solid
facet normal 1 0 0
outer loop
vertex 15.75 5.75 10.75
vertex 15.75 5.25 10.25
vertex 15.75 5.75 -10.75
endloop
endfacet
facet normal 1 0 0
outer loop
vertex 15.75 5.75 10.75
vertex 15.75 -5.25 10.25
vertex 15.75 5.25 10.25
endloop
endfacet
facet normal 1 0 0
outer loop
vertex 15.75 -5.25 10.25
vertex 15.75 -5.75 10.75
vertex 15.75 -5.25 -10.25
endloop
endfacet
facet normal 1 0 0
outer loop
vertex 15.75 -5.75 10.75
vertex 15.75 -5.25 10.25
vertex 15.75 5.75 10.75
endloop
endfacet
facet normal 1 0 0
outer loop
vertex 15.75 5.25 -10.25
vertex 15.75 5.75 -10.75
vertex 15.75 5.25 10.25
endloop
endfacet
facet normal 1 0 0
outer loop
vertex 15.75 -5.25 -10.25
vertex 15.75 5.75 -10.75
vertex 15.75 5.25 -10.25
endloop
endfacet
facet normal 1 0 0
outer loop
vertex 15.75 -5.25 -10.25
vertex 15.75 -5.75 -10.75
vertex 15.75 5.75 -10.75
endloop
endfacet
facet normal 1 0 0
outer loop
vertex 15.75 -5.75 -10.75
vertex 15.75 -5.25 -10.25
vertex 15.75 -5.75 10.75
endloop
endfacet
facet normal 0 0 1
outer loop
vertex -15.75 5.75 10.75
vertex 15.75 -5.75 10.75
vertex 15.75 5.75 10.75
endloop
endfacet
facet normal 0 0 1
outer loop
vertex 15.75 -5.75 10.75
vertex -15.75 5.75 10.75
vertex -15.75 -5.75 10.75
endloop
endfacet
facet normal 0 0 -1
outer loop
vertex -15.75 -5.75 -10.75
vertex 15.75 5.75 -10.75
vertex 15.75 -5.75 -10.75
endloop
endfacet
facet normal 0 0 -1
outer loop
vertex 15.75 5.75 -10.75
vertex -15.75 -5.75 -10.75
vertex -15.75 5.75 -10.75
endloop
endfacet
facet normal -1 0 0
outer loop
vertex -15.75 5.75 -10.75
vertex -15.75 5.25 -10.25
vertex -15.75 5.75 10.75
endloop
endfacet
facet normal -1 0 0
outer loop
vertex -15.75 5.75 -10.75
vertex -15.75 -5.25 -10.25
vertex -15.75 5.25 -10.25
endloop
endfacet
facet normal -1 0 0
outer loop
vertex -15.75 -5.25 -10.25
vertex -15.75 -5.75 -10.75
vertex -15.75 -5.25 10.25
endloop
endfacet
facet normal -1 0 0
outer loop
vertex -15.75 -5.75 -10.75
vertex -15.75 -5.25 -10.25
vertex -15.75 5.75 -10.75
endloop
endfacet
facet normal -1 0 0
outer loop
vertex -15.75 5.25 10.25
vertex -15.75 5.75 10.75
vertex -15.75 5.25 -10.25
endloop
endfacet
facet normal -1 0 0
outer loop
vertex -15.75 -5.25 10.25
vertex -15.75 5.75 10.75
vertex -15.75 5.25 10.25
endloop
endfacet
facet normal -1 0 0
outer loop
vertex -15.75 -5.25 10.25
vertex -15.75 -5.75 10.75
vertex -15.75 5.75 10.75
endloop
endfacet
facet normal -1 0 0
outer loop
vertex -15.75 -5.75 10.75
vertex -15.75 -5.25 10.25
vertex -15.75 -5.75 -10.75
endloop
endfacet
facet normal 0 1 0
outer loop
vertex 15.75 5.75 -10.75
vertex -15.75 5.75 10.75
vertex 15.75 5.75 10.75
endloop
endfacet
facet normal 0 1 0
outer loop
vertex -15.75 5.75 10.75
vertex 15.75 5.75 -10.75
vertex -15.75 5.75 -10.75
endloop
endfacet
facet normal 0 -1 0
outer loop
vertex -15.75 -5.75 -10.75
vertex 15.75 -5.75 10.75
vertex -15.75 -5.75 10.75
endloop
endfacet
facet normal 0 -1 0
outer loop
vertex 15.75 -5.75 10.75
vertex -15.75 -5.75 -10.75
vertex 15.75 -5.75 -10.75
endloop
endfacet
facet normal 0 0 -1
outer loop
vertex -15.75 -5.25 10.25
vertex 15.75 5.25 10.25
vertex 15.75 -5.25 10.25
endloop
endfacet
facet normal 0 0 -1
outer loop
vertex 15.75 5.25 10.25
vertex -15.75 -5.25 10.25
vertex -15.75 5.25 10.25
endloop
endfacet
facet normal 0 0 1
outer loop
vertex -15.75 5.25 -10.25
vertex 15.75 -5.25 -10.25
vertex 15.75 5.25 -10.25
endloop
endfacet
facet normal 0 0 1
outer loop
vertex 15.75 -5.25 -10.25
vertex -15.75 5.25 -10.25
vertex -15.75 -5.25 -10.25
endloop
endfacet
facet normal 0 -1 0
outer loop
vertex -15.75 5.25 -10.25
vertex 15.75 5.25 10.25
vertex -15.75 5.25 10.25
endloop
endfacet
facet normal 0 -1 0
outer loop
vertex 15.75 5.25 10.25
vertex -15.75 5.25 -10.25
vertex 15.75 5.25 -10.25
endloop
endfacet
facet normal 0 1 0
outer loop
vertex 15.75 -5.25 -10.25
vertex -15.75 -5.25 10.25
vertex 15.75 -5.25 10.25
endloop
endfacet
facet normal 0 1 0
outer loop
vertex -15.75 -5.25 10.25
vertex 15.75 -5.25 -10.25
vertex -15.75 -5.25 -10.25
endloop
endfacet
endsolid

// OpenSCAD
// Defines the fit between your hull and the rubber
distance_between_rubber_and_hull = 0.5;
// Defines the thickness of the hull's wall in mm
tickness = 1;
// width of the rubber in mm
width = 10;
// height of the rubber in mm
height = 20;
// length of the rubber in mm
length = 30;
difference() {
  cube([((length + distance_between_rubber_and_hull) + tickness), ((width + distance_between_rubber_and_hull) + tickness), ((height + distance_between_rubber_and_hull) + tickness)], center=true);

  cube([(length + distance_between_rubber_and_hull * 3), (width + distance_between_rubber_and_hull), (height + distance_between_rubber_and_hull)], center=true);
}
